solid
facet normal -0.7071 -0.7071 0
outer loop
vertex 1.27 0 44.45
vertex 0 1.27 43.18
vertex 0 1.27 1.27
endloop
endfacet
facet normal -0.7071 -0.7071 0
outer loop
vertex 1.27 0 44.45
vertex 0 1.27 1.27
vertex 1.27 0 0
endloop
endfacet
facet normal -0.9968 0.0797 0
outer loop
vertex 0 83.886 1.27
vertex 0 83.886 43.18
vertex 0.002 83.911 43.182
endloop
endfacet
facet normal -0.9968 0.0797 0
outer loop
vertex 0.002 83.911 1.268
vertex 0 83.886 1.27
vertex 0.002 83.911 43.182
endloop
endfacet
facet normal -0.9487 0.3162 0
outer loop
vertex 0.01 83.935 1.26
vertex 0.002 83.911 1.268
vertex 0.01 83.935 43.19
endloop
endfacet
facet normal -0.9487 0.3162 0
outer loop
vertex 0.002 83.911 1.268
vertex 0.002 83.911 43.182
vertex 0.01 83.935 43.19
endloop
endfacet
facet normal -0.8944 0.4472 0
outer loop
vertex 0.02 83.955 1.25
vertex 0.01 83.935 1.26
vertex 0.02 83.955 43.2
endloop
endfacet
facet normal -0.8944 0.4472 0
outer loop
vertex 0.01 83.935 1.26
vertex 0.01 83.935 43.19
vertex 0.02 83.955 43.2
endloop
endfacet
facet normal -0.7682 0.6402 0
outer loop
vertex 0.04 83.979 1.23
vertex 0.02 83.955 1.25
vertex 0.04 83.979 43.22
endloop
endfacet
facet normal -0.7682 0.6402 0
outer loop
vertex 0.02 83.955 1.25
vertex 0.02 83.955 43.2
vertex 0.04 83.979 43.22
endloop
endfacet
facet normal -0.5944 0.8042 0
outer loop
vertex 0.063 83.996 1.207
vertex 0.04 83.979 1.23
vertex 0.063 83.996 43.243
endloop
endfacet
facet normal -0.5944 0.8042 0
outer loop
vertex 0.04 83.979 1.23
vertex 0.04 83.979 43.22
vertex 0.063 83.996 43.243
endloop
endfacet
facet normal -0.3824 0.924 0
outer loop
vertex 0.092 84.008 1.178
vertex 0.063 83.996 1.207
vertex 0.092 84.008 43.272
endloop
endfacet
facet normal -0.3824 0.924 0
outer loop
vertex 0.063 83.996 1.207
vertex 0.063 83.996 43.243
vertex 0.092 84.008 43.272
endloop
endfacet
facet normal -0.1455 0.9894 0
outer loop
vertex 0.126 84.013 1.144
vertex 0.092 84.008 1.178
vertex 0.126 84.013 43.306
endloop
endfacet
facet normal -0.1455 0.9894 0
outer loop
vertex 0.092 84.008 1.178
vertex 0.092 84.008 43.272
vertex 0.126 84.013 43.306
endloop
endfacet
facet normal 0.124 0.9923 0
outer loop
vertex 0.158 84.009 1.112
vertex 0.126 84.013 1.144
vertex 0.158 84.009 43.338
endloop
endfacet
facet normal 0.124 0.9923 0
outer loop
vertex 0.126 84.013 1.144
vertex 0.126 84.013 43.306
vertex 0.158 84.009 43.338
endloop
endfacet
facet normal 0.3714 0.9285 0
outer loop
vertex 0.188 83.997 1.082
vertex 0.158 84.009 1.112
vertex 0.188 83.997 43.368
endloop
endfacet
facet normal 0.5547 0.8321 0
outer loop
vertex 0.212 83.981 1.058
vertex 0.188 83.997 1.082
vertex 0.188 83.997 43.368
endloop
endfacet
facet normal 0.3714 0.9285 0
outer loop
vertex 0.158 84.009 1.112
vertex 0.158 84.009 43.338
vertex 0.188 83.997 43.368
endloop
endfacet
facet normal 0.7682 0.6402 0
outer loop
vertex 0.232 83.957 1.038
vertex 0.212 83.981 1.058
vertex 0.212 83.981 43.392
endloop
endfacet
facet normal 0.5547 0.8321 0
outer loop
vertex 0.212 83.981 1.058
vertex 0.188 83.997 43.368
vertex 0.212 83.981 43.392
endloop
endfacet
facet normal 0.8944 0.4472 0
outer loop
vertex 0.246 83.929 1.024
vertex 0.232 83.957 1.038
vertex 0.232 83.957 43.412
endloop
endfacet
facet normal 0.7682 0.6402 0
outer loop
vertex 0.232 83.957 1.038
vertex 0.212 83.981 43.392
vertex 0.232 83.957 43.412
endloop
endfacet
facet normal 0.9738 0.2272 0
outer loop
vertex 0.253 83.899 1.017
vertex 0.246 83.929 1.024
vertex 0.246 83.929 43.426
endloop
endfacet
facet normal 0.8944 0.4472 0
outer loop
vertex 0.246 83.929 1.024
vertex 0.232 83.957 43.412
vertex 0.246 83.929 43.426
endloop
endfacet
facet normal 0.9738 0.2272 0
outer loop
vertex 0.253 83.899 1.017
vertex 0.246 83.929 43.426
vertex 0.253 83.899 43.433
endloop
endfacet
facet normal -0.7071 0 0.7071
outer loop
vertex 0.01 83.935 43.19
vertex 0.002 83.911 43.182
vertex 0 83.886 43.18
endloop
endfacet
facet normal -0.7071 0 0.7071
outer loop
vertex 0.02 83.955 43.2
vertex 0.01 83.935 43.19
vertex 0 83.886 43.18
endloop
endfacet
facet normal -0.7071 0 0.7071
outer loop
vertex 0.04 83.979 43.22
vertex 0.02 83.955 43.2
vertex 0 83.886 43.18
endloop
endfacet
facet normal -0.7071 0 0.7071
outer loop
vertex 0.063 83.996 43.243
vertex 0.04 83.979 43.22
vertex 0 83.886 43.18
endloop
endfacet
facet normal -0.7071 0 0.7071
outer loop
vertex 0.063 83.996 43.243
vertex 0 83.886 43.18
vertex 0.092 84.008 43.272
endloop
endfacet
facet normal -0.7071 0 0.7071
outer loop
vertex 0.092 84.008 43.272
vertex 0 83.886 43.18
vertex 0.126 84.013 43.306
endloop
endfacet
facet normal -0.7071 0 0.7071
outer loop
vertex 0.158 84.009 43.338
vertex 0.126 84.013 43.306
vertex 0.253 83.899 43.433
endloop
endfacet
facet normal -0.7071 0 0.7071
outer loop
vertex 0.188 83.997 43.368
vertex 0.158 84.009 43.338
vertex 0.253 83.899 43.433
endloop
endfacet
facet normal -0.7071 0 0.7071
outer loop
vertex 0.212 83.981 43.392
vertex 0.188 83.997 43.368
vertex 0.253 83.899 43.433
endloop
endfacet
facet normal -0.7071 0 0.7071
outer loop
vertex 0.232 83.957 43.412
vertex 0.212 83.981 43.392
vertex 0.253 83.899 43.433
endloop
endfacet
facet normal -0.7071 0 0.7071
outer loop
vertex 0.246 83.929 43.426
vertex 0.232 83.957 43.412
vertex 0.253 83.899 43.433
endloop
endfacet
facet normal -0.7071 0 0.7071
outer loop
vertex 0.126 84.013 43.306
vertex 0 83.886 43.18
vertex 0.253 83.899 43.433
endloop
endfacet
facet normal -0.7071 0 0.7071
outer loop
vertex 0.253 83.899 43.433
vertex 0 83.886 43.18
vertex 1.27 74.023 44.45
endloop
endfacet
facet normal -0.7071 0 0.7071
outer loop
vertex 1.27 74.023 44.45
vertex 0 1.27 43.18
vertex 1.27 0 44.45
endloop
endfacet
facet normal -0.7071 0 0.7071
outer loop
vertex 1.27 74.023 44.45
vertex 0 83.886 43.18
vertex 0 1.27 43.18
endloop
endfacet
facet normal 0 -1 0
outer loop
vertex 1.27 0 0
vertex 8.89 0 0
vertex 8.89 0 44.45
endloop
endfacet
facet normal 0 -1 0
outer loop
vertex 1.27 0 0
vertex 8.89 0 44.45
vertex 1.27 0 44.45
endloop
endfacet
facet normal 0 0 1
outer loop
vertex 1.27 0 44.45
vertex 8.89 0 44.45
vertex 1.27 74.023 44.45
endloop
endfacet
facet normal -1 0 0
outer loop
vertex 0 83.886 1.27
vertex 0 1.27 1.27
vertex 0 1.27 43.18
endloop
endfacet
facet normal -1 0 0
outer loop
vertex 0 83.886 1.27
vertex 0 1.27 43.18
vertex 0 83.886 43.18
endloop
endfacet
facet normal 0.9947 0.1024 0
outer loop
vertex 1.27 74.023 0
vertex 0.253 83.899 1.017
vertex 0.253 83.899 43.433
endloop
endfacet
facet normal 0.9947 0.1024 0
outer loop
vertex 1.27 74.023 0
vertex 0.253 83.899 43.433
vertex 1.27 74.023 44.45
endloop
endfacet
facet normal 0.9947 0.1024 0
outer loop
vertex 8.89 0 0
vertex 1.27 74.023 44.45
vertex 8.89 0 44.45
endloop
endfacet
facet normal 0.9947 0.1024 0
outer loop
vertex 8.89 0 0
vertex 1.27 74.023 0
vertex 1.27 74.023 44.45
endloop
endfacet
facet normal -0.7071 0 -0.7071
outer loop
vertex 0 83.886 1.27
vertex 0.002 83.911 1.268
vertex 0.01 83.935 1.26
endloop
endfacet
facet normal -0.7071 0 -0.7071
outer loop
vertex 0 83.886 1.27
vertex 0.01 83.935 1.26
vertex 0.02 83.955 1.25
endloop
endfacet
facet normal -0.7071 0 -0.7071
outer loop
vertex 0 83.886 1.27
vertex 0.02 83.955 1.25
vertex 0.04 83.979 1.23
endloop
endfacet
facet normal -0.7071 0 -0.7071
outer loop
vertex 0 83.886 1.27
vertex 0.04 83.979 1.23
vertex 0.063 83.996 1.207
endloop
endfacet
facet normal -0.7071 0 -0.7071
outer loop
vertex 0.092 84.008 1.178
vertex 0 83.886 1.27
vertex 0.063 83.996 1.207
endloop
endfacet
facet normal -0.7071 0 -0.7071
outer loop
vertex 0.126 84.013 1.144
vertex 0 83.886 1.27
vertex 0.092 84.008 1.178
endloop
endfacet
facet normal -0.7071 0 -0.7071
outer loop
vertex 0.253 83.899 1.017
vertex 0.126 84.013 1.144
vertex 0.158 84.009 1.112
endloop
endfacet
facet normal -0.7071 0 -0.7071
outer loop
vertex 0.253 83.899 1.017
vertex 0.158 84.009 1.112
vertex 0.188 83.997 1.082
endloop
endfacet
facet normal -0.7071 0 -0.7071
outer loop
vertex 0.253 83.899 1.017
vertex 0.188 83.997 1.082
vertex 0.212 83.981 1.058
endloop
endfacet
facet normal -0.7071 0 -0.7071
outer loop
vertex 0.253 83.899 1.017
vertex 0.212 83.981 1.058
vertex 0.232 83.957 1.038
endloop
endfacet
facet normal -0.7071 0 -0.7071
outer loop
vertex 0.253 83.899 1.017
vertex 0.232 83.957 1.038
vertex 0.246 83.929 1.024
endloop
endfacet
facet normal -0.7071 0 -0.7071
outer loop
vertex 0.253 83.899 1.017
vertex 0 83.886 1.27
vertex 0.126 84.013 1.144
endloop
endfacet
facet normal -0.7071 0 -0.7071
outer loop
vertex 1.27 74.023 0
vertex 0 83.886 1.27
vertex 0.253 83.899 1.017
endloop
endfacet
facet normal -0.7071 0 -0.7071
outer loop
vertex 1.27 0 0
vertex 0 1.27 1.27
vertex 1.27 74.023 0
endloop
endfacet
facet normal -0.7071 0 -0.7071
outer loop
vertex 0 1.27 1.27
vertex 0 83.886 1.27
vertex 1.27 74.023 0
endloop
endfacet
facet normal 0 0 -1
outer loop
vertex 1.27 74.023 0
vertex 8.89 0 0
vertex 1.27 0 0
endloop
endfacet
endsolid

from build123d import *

# Parameters (mm, degrees)
BOSS_EXTRUDE1_DEPTH = 44.45
FILLET1_R           = 0.127
CHAMFER2_SIZE       = 1.27


with BuildPart() as part:
    # Sketch1 → Boss-Extrude1 (new body)
    with BuildSketch(Plane.XY):
        Polygon((0, 0), (0, 86.36), (8.89, 0), align=None)
    extrude(amount=BOSS_EXTRUDE1_DEPTH)

    # Fillet1
    fillet1_edges = [part.edges().sort_by_distance(p)[0] for p in [
        (0, 86.36, 22.225),
    ]]
    fillet(fillet1_edges, radius=FILLET1_R)

    # Chamfer2
    # the kernel refuses this chamfer: 1.27 mm, written as the material it takes off along each edge
    with BuildSketch(Plane(origin=(0, -3.266037395, 0), x_dir=(0, 0, 1), z_dir=(0, 1, 0))) as chamfer2_piece_1:
        Polygon((CHAMFER2_SIZE, 0), (0, CHAMFER2_SIZE), (0, 0), align=None)
    extrude(amount=90.418126679, mode=Mode.SUBTRACT)
    with BuildSketch(Plane(origin=(0, 0, -3.266037395), x_dir=(0, 1, 0), z_dir=(0, 0, 1))) as chamfer2_piece_2:
        Polygon((CHAMFER2_SIZE, 0), (0, -CHAMFER2_SIZE), (0, 0), align=None)
    extrude(amount=50.982074789, mode=Mode.SUBTRACT)
    with BuildSketch(Plane(origin=(0, -3.266037395, 44.45), x_dir=(0, 0, -1), z_dir=(0, 1, 0))) as chamfer2_piece_3:
        Polygon((CHAMFER2_SIZE, 0), (0, -CHAMFER2_SIZE), (0, 0), align=None)
    extrude(amount=90.418126679, mode=Mode.SUBTRACT)


solid = part.part
